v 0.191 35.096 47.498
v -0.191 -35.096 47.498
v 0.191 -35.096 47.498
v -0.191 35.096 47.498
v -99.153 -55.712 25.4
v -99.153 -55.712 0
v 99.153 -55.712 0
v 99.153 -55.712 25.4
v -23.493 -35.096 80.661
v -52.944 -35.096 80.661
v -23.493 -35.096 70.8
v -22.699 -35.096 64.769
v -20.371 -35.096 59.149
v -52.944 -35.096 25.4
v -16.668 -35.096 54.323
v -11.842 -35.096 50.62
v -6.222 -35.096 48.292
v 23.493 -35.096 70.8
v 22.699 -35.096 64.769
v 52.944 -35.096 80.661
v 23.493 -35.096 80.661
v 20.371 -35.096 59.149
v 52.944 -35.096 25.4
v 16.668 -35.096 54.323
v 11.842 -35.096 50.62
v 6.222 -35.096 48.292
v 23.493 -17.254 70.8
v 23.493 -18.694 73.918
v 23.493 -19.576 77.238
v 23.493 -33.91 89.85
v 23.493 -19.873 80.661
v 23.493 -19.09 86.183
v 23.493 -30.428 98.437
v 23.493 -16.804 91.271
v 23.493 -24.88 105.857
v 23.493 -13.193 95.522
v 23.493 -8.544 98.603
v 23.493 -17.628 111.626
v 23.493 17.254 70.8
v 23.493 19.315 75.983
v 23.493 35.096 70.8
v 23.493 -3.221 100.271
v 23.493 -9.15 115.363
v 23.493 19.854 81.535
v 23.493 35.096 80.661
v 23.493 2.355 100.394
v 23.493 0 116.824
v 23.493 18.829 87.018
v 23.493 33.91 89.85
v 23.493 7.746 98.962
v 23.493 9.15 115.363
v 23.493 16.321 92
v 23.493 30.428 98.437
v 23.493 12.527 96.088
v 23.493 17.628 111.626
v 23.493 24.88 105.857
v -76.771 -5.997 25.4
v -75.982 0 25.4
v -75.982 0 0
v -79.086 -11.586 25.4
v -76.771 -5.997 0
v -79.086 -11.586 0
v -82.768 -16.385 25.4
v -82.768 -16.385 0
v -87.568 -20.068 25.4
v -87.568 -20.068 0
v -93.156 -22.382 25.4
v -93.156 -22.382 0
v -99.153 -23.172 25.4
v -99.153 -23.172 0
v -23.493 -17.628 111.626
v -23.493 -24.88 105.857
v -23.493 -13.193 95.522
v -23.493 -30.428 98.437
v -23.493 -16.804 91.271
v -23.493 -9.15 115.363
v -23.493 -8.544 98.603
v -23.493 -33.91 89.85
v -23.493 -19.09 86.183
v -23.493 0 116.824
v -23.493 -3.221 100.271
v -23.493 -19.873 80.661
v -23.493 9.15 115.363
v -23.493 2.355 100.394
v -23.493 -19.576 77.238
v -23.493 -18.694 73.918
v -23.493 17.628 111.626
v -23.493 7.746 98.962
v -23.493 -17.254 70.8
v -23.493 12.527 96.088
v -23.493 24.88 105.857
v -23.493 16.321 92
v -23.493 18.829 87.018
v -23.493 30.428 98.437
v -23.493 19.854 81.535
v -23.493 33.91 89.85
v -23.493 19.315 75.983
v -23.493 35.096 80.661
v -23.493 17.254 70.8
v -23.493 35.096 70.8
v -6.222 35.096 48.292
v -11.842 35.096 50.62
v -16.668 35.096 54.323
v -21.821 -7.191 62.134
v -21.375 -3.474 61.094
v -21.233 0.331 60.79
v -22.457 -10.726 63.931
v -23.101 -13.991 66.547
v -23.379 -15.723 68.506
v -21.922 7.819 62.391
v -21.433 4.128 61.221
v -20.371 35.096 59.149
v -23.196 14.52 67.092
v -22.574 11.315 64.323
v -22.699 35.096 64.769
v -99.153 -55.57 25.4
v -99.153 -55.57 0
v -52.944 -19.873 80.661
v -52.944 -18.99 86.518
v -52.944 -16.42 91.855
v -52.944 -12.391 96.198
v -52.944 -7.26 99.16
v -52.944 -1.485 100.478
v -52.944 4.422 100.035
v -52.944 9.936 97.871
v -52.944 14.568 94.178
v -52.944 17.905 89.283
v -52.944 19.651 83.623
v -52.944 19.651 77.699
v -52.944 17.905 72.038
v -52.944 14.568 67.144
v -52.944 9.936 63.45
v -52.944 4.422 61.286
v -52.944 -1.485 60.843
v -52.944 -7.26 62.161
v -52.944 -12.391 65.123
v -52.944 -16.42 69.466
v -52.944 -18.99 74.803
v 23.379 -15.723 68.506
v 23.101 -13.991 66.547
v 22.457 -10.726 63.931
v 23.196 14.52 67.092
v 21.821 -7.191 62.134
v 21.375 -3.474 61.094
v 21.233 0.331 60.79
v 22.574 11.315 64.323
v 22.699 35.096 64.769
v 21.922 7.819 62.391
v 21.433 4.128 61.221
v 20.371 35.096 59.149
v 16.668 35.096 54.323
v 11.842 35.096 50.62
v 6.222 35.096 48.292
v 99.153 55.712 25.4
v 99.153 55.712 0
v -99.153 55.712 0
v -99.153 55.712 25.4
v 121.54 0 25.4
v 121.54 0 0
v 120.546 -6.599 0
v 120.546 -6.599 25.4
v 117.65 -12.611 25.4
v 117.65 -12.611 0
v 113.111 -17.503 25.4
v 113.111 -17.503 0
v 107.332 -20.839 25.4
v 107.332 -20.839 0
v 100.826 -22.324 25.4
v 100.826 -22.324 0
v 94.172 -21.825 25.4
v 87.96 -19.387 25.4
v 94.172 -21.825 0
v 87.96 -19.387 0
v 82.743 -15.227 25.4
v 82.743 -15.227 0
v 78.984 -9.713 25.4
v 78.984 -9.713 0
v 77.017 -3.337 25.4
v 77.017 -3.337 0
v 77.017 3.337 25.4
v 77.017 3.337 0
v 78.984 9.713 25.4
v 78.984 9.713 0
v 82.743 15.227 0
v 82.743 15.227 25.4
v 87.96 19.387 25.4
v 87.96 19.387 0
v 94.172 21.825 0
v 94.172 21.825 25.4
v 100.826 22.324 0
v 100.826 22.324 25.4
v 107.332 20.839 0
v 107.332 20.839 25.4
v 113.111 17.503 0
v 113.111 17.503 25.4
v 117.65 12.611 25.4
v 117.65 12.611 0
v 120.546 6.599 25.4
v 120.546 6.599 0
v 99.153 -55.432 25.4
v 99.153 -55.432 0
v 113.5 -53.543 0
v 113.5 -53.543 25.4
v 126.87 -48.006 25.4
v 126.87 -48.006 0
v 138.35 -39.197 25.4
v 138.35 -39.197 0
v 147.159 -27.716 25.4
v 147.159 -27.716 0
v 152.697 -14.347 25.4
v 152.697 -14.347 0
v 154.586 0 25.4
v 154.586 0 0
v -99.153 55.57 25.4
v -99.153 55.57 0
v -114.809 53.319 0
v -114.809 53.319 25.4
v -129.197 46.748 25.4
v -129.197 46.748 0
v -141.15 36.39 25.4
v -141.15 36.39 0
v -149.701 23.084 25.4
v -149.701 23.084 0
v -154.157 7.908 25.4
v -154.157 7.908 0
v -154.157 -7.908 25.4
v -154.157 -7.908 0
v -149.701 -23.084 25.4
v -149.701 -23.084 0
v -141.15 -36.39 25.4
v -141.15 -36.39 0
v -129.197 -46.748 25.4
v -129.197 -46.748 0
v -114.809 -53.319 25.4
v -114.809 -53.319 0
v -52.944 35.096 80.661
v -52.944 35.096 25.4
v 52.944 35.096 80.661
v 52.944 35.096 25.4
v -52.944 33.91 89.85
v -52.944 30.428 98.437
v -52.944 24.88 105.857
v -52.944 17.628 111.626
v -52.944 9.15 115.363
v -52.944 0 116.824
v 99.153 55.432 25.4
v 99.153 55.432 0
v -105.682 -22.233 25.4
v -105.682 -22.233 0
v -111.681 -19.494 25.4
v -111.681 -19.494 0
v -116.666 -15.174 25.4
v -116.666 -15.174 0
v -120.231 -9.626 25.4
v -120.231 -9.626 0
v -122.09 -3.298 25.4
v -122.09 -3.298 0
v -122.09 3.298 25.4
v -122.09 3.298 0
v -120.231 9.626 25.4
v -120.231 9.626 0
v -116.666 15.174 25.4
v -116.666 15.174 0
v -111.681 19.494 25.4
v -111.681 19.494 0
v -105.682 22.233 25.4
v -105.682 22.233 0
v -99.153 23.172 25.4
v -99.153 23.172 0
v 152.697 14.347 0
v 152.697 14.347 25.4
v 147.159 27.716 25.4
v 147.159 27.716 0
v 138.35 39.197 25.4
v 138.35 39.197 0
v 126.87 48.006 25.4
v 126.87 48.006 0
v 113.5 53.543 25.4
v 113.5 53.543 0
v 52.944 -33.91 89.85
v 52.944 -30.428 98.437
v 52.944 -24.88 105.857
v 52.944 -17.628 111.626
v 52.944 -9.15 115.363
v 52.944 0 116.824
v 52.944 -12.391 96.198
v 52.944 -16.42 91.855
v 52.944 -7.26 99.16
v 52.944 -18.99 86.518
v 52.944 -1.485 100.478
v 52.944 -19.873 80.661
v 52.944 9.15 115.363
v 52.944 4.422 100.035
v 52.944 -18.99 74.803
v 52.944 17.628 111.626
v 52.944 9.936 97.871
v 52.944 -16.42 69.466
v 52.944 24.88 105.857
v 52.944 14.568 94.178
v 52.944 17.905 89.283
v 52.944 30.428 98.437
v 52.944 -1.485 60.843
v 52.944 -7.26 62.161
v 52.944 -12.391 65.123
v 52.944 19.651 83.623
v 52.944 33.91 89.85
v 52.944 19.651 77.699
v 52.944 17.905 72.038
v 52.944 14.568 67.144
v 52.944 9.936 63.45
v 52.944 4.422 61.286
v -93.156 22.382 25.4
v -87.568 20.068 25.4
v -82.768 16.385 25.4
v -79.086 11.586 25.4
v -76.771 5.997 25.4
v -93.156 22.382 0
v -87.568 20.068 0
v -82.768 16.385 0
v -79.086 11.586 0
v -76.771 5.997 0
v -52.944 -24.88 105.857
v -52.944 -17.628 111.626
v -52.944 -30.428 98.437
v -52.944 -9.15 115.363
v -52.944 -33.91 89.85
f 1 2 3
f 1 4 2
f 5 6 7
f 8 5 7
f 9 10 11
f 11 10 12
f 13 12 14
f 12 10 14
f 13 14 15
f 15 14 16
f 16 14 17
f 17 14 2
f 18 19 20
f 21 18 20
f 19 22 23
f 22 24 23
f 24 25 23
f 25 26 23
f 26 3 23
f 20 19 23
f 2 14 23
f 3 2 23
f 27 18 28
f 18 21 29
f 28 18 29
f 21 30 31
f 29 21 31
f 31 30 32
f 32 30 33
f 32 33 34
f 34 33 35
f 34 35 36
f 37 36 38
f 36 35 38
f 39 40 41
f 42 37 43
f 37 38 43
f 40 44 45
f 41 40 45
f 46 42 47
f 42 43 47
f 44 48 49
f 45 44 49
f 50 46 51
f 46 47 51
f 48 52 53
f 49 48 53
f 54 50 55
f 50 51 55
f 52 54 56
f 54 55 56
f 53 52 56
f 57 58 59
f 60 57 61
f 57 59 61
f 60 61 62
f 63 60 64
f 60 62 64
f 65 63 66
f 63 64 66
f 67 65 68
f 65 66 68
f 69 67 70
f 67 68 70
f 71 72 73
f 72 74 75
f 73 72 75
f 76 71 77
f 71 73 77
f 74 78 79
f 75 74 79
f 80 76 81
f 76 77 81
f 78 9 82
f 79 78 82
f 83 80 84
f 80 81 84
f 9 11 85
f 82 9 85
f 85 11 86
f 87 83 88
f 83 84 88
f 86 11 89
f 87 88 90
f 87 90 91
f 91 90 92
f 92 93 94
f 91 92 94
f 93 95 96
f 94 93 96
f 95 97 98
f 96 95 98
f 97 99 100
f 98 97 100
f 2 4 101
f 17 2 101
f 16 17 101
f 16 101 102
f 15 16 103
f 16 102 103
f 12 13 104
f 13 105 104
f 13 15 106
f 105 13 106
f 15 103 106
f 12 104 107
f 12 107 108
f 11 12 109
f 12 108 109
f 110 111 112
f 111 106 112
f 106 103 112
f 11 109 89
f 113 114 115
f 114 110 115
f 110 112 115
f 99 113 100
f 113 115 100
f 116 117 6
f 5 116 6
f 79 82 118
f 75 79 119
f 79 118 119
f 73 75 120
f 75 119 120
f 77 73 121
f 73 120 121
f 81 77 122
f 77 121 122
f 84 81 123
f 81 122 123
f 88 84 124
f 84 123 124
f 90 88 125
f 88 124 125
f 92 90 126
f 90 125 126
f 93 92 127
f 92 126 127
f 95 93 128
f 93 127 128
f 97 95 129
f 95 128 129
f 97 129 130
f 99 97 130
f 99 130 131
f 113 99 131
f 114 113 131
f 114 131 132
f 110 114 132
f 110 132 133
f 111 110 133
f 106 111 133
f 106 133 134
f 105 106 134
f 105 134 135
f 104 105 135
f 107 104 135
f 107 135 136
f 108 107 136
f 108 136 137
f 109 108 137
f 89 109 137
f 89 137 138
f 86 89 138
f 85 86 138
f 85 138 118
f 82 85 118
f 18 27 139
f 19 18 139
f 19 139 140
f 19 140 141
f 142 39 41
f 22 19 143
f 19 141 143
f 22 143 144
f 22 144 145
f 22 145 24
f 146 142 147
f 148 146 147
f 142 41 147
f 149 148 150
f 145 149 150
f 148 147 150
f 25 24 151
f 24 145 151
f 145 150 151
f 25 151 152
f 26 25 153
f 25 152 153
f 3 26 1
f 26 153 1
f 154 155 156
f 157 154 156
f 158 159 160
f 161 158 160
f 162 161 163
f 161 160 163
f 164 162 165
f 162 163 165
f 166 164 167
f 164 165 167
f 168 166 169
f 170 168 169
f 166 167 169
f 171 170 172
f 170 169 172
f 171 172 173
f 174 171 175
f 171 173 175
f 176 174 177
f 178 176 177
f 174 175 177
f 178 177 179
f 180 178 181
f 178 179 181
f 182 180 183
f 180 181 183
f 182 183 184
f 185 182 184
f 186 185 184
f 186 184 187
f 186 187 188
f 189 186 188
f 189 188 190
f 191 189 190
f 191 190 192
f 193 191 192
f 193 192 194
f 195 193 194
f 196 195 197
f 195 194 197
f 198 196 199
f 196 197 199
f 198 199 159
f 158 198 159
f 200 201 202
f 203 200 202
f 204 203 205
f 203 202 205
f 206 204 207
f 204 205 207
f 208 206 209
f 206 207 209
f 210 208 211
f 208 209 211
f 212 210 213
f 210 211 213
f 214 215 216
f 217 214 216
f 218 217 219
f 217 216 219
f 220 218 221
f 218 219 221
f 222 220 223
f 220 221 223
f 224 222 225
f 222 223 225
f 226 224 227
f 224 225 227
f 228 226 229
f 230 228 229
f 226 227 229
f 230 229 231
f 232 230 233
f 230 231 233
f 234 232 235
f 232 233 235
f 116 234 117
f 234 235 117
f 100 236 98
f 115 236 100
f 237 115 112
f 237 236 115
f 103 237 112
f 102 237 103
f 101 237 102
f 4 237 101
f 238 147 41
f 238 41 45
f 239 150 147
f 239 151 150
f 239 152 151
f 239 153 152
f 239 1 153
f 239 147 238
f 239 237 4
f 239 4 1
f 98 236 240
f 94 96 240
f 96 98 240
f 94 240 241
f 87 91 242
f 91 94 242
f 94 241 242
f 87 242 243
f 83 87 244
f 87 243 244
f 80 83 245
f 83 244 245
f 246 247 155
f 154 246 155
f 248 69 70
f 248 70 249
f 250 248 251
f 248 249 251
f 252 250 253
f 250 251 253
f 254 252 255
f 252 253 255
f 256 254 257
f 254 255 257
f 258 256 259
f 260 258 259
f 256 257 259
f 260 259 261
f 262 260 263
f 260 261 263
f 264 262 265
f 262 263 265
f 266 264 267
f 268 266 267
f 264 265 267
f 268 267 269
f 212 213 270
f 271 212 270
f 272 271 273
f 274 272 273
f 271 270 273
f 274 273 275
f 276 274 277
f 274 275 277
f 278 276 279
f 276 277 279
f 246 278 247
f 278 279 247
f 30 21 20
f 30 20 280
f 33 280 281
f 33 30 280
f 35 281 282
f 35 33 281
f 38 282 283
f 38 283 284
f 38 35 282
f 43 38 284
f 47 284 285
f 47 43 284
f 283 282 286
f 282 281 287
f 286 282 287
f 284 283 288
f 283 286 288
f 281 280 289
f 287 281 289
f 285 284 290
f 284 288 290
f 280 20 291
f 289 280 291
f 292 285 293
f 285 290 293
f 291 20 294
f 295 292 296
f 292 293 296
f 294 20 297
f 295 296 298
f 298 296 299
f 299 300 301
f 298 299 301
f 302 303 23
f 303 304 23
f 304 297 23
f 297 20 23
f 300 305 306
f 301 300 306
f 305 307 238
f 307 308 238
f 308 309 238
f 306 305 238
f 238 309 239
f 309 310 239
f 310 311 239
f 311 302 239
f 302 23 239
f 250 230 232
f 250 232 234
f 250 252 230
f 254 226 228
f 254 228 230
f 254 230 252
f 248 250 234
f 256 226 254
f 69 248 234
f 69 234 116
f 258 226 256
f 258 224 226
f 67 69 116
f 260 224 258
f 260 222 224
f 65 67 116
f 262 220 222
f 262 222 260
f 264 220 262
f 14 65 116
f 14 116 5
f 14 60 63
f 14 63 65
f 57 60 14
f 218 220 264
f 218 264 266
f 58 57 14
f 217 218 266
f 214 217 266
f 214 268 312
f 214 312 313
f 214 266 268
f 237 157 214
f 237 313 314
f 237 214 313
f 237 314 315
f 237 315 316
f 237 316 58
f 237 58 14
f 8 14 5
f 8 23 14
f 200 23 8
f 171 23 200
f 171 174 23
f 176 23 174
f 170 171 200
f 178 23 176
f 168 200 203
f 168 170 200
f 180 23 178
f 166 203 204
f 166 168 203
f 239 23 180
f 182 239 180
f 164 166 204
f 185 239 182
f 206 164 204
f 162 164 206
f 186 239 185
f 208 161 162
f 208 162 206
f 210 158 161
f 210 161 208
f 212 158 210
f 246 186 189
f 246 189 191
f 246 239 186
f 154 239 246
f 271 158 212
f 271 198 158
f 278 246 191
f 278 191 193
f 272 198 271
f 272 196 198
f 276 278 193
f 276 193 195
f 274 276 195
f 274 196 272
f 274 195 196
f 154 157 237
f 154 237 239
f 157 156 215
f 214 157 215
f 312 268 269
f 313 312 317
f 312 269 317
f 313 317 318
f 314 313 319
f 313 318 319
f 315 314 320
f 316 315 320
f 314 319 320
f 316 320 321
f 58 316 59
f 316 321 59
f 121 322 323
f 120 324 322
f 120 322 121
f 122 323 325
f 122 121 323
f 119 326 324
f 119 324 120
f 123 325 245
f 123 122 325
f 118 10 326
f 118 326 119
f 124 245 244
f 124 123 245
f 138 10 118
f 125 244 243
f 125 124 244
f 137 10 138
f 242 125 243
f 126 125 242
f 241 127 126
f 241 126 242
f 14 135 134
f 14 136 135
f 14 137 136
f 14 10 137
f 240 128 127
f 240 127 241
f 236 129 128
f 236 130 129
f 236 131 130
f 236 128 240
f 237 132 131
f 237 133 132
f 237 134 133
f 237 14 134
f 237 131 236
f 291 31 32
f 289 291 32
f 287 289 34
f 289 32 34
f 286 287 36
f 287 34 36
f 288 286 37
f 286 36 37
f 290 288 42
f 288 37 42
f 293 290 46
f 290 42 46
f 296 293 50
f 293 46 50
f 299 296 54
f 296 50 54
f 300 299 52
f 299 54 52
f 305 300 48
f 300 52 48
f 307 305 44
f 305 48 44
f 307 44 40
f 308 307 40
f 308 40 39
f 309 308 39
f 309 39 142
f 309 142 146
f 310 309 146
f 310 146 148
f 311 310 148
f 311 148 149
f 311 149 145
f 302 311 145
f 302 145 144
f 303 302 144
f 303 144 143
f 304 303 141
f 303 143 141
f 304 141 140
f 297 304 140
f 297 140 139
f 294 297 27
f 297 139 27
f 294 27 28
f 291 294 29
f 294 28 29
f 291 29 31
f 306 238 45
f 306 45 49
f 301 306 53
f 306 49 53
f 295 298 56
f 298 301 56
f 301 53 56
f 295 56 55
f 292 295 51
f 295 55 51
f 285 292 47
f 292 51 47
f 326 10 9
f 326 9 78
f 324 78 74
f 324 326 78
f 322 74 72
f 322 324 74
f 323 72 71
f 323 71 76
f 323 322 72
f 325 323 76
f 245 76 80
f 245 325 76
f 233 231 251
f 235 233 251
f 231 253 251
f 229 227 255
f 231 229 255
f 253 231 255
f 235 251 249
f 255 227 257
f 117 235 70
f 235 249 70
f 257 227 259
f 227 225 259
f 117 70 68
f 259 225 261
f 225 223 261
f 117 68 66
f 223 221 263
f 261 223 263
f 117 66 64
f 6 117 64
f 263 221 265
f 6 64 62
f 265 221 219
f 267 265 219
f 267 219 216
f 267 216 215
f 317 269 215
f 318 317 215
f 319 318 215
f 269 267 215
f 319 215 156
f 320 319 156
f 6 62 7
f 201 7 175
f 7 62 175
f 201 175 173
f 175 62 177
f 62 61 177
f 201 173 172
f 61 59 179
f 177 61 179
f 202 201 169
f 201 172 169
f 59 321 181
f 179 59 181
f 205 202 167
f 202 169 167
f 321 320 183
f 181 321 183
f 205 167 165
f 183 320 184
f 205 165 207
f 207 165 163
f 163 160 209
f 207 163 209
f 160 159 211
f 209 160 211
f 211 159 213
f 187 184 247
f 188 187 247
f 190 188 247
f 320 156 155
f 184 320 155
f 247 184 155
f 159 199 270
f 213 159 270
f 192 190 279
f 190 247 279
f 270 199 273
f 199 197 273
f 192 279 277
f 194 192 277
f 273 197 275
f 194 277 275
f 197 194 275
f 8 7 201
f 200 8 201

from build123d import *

# Parameters (mm, degrees)
F1_DEPTH    = 25.4
F2_W        = 105.8882400393
F2_H        = 70.1928213239
F3_DEPTH    = 55.88
F4_W        = 46.9851754606
F4_H        = 70.1928213239
F5_DEPTH    = 33.782
F6_R        = 23.301989304
F7_DEPTH    = 35.56
F8_T1_DEPTH = 210.348554518
F8_T3_DEPTH = 210.348554518
F9_R        = 19.8729907894
F10_DEPTH   = 207.5309093164


# Not quite as in the source:
# - a fillet or chamfer that OpenCascade refuses, or shapes differently, is made with other operations: its cross-section is extruded or revolved along the edge and cut away or added


with BuildPart() as f1:
    # F0 (on Top) → F1 (new body)
    with BuildSketch(Plane.XY):
        with BuildLine():
            Line((-99.153496325, -55.7124875486), (99.153496325, -55.7124875486))
            Line((99.153496325, -55.7124875486), (99.153496325, -55.4322929717))
            ThreePointArc((99.153496325, -55.4322929717), (43.7212033534, 0), (99.153496325, 55.4322929717))
            Line((99.153496325, 55.4322929717), (99.153496325, 55.7124875486))
            Line((99.153496325, 55.7124875486), (-99.153496325, 55.7124875486))
            Line((-99.153496325, 55.7124875486), (-99.153496325, 55.5695868493))
            ThreePointArc((-99.153496325, 55.5695868493), (-59.8598646362, 39.2936316888), (-43.5839094758, 0))
            ThreePointArc((-43.5839094758, 0), (-59.8598646362, -39.2936316888), (-99.153496325, -55.5695868493))
            Line((-99.153496325, -55.5695868493), (-99.153496325, -55.7124875486))
        make_face()
        with BuildLine():
            Line((99.153496325, -22.3866111857), (99.153496325, -55.4322929717))
            ThreePointArc((99.153496325, -55.4322929717), (138.350046582, -39.196550257), (154.5857892967, 0))
            ThreePointArc((154.5857892967, 0), (138.350046582, 39.196550257), (99.153496325, 55.4322929717))
            Line((99.153496325, 55.4322929717), (99.153496325, 22.3866111857))
            ThreePointArc((99.153496325, 22.3866111857), (114.9832209022, 15.8297245772), (121.5401075107, 0))
            ThreePointArc((121.5401075107, 0), (114.9832209022, -15.8297245772), (99.153496325, -22.3866111857))
        make_face()
        with BuildLine():
            ThreePointArc((-99.153496325, 55.5695868493), (-154.7230831743, 0), (-99.153496325, -55.5695868493))
            Line((-99.153496325, -55.5695868493), (-99.153496325, -23.1719717835))
            ThreePointArc((-99.153496325, -23.1719717835), (-122.3254681085, 0), (-99.153496325, 23.1719717835))
            Line((-99.153496325, 23.1719717835), (-99.153496325, 55.5695868493))
        make_face()
        with BuildLine():
            ThreePointArc((99.153496325, 55.4322929717), (43.7212033534, 0), (99.153496325, -55.4322929717))
            Line((99.153496325, -55.4322929717), (99.153496325, -22.3866111857))
            ThreePointArc((99.153496325, -22.3866111857), (76.7668851393, 0), (99.153496325, 22.3866111857))
            Line((99.153496325, 22.3866111857), (99.153496325, 55.4322929717))
        make_face()
        with BuildLine():
            Line((-99.153496325, -23.1719717835), (-99.153496325, -55.5695868493))
            ThreePointArc((-99.153496325, -55.5695868493), (-59.8598646362, -39.2936316888), (-43.5839094758, 0))
            ThreePointArc((-43.5839094758, 0), (-59.8598646362, 39.2936316888), (-99.153496325, 55.5695868493))
            Line((-99.153496325, 55.5695868493), (-99.153496325, 23.1719717835))
            ThreePointArc((-99.153496325, 23.1719717835), (-82.7684379434, 16.3850583816), (-75.9815245415, 0))
            ThreePointArc((-75.9815245415, 0), (-82.7684379434, -16.3850583816), (-99.153496325, -23.1719717835))
        make_face()
    extrude(amount=F1_DEPTH)

    # F2 (on face) → F3 (join)
    with BuildSketch(Plane.XY.offset(25.4)):
        Rectangle(F2_W, F2_H)
    extrude(amount=F3_DEPTH)

    # F4 (on face) → F5 (cut)
    with BuildSketch(Plane.XY.offset(81.28)):
        Rectangle(F4_W, F4_H)
    extrude(amount=-F5_DEPTH, mode=Mode.SUBTRACT)

    # F6
    f6_edges = [f1.edges().sort_by_distance(p)[0] for p in [
        (-23.492588, 0, 47.498),
        (23.492588, 0, 47.498),
    ]]
    fillet(f6_edges, radius=F6_R)

    # F7 (add): faces of the model
    f7_faces = [f1.faces().sort_by_distance(p)[0] for p in [
        (-38.218353875, 0, 81.28),
        (38.218353875, 0, 81.28),
    ]]
    extrude(f7_faces, amount=F7_DEPTH)

    # F8: fillet of radius 36.1794044457 on 4 edges, made by hand

    # F8_s2 → F8_t1 (cut)
    with BuildSketch(Plane.YZ.offset(-143.392631134)):
        with BuildLine():
            ThreePointArc((-35.0964106619, 80.6605955543), (-24.4997084391, 106.2432977771), (1.0829937838, 116.84))
            Line((1.0829937838, 116.84), (-35.0964106619, 116.84))
            Line((-35.0964106619, 116.84), (-35.0964106619, 80.6605955543))
        make_face()
        with BuildLine():
            ThreePointArc((35.0964106619, 80.6605955543), (24.4997084391, 106.2432977771), (-1.0829937838, 116.84))
            Line((-1.0829937838, 116.84), (35.0964106619, 116.84))
            Line((35.0964106619, 116.84), (35.0964106619, 80.6605955543))
        make_face()
    extrude(amount=F8_T1_DEPTH, mode=Mode.SUBTRACT)

    # F8_s4 → F8_t3 (cut)
    with BuildSketch(Plane.YZ.offset(-66.955923384)):
        with BuildLine():
            ThreePointArc((-35.0964106619, 80.6605955543), (-24.4997084391, 106.2432977771), (1.0829937838, 116.84))
            Line((1.0829937838, 116.84), (-35.0964106619, 116.84))
            Line((-35.0964106619, 116.84), (-35.0964106619, 80.6605955543))
        make_face()
        with BuildLine():
            ThreePointArc((35.0964106619, 80.6605955543), (24.4997084391, 106.2432977771), (-1.0829937838, 116.84))
            Line((-1.0829937838, 116.84), (35.0964106619, 116.84))
            Line((35.0964106619, 116.84), (35.0964106619, 80.6605955543))
        make_face()
    extrude(amount=F8_T3_DEPTH, mode=Mode.SUBTRACT)

    # F9 (on face) → F10 (cut, through all)
    with BuildSketch(Plane(origin=(-52.9441200197, 0, 0), x_dir=(0, -1, 0), z_dir=(-1, 0, 0))):
        with Locations((0, 80.6605955543)):
            Circle(F9_R)
    extrude(amount=-F10_DEPTH, mode=Mode.SUBTRACT)


solid = f1.part
